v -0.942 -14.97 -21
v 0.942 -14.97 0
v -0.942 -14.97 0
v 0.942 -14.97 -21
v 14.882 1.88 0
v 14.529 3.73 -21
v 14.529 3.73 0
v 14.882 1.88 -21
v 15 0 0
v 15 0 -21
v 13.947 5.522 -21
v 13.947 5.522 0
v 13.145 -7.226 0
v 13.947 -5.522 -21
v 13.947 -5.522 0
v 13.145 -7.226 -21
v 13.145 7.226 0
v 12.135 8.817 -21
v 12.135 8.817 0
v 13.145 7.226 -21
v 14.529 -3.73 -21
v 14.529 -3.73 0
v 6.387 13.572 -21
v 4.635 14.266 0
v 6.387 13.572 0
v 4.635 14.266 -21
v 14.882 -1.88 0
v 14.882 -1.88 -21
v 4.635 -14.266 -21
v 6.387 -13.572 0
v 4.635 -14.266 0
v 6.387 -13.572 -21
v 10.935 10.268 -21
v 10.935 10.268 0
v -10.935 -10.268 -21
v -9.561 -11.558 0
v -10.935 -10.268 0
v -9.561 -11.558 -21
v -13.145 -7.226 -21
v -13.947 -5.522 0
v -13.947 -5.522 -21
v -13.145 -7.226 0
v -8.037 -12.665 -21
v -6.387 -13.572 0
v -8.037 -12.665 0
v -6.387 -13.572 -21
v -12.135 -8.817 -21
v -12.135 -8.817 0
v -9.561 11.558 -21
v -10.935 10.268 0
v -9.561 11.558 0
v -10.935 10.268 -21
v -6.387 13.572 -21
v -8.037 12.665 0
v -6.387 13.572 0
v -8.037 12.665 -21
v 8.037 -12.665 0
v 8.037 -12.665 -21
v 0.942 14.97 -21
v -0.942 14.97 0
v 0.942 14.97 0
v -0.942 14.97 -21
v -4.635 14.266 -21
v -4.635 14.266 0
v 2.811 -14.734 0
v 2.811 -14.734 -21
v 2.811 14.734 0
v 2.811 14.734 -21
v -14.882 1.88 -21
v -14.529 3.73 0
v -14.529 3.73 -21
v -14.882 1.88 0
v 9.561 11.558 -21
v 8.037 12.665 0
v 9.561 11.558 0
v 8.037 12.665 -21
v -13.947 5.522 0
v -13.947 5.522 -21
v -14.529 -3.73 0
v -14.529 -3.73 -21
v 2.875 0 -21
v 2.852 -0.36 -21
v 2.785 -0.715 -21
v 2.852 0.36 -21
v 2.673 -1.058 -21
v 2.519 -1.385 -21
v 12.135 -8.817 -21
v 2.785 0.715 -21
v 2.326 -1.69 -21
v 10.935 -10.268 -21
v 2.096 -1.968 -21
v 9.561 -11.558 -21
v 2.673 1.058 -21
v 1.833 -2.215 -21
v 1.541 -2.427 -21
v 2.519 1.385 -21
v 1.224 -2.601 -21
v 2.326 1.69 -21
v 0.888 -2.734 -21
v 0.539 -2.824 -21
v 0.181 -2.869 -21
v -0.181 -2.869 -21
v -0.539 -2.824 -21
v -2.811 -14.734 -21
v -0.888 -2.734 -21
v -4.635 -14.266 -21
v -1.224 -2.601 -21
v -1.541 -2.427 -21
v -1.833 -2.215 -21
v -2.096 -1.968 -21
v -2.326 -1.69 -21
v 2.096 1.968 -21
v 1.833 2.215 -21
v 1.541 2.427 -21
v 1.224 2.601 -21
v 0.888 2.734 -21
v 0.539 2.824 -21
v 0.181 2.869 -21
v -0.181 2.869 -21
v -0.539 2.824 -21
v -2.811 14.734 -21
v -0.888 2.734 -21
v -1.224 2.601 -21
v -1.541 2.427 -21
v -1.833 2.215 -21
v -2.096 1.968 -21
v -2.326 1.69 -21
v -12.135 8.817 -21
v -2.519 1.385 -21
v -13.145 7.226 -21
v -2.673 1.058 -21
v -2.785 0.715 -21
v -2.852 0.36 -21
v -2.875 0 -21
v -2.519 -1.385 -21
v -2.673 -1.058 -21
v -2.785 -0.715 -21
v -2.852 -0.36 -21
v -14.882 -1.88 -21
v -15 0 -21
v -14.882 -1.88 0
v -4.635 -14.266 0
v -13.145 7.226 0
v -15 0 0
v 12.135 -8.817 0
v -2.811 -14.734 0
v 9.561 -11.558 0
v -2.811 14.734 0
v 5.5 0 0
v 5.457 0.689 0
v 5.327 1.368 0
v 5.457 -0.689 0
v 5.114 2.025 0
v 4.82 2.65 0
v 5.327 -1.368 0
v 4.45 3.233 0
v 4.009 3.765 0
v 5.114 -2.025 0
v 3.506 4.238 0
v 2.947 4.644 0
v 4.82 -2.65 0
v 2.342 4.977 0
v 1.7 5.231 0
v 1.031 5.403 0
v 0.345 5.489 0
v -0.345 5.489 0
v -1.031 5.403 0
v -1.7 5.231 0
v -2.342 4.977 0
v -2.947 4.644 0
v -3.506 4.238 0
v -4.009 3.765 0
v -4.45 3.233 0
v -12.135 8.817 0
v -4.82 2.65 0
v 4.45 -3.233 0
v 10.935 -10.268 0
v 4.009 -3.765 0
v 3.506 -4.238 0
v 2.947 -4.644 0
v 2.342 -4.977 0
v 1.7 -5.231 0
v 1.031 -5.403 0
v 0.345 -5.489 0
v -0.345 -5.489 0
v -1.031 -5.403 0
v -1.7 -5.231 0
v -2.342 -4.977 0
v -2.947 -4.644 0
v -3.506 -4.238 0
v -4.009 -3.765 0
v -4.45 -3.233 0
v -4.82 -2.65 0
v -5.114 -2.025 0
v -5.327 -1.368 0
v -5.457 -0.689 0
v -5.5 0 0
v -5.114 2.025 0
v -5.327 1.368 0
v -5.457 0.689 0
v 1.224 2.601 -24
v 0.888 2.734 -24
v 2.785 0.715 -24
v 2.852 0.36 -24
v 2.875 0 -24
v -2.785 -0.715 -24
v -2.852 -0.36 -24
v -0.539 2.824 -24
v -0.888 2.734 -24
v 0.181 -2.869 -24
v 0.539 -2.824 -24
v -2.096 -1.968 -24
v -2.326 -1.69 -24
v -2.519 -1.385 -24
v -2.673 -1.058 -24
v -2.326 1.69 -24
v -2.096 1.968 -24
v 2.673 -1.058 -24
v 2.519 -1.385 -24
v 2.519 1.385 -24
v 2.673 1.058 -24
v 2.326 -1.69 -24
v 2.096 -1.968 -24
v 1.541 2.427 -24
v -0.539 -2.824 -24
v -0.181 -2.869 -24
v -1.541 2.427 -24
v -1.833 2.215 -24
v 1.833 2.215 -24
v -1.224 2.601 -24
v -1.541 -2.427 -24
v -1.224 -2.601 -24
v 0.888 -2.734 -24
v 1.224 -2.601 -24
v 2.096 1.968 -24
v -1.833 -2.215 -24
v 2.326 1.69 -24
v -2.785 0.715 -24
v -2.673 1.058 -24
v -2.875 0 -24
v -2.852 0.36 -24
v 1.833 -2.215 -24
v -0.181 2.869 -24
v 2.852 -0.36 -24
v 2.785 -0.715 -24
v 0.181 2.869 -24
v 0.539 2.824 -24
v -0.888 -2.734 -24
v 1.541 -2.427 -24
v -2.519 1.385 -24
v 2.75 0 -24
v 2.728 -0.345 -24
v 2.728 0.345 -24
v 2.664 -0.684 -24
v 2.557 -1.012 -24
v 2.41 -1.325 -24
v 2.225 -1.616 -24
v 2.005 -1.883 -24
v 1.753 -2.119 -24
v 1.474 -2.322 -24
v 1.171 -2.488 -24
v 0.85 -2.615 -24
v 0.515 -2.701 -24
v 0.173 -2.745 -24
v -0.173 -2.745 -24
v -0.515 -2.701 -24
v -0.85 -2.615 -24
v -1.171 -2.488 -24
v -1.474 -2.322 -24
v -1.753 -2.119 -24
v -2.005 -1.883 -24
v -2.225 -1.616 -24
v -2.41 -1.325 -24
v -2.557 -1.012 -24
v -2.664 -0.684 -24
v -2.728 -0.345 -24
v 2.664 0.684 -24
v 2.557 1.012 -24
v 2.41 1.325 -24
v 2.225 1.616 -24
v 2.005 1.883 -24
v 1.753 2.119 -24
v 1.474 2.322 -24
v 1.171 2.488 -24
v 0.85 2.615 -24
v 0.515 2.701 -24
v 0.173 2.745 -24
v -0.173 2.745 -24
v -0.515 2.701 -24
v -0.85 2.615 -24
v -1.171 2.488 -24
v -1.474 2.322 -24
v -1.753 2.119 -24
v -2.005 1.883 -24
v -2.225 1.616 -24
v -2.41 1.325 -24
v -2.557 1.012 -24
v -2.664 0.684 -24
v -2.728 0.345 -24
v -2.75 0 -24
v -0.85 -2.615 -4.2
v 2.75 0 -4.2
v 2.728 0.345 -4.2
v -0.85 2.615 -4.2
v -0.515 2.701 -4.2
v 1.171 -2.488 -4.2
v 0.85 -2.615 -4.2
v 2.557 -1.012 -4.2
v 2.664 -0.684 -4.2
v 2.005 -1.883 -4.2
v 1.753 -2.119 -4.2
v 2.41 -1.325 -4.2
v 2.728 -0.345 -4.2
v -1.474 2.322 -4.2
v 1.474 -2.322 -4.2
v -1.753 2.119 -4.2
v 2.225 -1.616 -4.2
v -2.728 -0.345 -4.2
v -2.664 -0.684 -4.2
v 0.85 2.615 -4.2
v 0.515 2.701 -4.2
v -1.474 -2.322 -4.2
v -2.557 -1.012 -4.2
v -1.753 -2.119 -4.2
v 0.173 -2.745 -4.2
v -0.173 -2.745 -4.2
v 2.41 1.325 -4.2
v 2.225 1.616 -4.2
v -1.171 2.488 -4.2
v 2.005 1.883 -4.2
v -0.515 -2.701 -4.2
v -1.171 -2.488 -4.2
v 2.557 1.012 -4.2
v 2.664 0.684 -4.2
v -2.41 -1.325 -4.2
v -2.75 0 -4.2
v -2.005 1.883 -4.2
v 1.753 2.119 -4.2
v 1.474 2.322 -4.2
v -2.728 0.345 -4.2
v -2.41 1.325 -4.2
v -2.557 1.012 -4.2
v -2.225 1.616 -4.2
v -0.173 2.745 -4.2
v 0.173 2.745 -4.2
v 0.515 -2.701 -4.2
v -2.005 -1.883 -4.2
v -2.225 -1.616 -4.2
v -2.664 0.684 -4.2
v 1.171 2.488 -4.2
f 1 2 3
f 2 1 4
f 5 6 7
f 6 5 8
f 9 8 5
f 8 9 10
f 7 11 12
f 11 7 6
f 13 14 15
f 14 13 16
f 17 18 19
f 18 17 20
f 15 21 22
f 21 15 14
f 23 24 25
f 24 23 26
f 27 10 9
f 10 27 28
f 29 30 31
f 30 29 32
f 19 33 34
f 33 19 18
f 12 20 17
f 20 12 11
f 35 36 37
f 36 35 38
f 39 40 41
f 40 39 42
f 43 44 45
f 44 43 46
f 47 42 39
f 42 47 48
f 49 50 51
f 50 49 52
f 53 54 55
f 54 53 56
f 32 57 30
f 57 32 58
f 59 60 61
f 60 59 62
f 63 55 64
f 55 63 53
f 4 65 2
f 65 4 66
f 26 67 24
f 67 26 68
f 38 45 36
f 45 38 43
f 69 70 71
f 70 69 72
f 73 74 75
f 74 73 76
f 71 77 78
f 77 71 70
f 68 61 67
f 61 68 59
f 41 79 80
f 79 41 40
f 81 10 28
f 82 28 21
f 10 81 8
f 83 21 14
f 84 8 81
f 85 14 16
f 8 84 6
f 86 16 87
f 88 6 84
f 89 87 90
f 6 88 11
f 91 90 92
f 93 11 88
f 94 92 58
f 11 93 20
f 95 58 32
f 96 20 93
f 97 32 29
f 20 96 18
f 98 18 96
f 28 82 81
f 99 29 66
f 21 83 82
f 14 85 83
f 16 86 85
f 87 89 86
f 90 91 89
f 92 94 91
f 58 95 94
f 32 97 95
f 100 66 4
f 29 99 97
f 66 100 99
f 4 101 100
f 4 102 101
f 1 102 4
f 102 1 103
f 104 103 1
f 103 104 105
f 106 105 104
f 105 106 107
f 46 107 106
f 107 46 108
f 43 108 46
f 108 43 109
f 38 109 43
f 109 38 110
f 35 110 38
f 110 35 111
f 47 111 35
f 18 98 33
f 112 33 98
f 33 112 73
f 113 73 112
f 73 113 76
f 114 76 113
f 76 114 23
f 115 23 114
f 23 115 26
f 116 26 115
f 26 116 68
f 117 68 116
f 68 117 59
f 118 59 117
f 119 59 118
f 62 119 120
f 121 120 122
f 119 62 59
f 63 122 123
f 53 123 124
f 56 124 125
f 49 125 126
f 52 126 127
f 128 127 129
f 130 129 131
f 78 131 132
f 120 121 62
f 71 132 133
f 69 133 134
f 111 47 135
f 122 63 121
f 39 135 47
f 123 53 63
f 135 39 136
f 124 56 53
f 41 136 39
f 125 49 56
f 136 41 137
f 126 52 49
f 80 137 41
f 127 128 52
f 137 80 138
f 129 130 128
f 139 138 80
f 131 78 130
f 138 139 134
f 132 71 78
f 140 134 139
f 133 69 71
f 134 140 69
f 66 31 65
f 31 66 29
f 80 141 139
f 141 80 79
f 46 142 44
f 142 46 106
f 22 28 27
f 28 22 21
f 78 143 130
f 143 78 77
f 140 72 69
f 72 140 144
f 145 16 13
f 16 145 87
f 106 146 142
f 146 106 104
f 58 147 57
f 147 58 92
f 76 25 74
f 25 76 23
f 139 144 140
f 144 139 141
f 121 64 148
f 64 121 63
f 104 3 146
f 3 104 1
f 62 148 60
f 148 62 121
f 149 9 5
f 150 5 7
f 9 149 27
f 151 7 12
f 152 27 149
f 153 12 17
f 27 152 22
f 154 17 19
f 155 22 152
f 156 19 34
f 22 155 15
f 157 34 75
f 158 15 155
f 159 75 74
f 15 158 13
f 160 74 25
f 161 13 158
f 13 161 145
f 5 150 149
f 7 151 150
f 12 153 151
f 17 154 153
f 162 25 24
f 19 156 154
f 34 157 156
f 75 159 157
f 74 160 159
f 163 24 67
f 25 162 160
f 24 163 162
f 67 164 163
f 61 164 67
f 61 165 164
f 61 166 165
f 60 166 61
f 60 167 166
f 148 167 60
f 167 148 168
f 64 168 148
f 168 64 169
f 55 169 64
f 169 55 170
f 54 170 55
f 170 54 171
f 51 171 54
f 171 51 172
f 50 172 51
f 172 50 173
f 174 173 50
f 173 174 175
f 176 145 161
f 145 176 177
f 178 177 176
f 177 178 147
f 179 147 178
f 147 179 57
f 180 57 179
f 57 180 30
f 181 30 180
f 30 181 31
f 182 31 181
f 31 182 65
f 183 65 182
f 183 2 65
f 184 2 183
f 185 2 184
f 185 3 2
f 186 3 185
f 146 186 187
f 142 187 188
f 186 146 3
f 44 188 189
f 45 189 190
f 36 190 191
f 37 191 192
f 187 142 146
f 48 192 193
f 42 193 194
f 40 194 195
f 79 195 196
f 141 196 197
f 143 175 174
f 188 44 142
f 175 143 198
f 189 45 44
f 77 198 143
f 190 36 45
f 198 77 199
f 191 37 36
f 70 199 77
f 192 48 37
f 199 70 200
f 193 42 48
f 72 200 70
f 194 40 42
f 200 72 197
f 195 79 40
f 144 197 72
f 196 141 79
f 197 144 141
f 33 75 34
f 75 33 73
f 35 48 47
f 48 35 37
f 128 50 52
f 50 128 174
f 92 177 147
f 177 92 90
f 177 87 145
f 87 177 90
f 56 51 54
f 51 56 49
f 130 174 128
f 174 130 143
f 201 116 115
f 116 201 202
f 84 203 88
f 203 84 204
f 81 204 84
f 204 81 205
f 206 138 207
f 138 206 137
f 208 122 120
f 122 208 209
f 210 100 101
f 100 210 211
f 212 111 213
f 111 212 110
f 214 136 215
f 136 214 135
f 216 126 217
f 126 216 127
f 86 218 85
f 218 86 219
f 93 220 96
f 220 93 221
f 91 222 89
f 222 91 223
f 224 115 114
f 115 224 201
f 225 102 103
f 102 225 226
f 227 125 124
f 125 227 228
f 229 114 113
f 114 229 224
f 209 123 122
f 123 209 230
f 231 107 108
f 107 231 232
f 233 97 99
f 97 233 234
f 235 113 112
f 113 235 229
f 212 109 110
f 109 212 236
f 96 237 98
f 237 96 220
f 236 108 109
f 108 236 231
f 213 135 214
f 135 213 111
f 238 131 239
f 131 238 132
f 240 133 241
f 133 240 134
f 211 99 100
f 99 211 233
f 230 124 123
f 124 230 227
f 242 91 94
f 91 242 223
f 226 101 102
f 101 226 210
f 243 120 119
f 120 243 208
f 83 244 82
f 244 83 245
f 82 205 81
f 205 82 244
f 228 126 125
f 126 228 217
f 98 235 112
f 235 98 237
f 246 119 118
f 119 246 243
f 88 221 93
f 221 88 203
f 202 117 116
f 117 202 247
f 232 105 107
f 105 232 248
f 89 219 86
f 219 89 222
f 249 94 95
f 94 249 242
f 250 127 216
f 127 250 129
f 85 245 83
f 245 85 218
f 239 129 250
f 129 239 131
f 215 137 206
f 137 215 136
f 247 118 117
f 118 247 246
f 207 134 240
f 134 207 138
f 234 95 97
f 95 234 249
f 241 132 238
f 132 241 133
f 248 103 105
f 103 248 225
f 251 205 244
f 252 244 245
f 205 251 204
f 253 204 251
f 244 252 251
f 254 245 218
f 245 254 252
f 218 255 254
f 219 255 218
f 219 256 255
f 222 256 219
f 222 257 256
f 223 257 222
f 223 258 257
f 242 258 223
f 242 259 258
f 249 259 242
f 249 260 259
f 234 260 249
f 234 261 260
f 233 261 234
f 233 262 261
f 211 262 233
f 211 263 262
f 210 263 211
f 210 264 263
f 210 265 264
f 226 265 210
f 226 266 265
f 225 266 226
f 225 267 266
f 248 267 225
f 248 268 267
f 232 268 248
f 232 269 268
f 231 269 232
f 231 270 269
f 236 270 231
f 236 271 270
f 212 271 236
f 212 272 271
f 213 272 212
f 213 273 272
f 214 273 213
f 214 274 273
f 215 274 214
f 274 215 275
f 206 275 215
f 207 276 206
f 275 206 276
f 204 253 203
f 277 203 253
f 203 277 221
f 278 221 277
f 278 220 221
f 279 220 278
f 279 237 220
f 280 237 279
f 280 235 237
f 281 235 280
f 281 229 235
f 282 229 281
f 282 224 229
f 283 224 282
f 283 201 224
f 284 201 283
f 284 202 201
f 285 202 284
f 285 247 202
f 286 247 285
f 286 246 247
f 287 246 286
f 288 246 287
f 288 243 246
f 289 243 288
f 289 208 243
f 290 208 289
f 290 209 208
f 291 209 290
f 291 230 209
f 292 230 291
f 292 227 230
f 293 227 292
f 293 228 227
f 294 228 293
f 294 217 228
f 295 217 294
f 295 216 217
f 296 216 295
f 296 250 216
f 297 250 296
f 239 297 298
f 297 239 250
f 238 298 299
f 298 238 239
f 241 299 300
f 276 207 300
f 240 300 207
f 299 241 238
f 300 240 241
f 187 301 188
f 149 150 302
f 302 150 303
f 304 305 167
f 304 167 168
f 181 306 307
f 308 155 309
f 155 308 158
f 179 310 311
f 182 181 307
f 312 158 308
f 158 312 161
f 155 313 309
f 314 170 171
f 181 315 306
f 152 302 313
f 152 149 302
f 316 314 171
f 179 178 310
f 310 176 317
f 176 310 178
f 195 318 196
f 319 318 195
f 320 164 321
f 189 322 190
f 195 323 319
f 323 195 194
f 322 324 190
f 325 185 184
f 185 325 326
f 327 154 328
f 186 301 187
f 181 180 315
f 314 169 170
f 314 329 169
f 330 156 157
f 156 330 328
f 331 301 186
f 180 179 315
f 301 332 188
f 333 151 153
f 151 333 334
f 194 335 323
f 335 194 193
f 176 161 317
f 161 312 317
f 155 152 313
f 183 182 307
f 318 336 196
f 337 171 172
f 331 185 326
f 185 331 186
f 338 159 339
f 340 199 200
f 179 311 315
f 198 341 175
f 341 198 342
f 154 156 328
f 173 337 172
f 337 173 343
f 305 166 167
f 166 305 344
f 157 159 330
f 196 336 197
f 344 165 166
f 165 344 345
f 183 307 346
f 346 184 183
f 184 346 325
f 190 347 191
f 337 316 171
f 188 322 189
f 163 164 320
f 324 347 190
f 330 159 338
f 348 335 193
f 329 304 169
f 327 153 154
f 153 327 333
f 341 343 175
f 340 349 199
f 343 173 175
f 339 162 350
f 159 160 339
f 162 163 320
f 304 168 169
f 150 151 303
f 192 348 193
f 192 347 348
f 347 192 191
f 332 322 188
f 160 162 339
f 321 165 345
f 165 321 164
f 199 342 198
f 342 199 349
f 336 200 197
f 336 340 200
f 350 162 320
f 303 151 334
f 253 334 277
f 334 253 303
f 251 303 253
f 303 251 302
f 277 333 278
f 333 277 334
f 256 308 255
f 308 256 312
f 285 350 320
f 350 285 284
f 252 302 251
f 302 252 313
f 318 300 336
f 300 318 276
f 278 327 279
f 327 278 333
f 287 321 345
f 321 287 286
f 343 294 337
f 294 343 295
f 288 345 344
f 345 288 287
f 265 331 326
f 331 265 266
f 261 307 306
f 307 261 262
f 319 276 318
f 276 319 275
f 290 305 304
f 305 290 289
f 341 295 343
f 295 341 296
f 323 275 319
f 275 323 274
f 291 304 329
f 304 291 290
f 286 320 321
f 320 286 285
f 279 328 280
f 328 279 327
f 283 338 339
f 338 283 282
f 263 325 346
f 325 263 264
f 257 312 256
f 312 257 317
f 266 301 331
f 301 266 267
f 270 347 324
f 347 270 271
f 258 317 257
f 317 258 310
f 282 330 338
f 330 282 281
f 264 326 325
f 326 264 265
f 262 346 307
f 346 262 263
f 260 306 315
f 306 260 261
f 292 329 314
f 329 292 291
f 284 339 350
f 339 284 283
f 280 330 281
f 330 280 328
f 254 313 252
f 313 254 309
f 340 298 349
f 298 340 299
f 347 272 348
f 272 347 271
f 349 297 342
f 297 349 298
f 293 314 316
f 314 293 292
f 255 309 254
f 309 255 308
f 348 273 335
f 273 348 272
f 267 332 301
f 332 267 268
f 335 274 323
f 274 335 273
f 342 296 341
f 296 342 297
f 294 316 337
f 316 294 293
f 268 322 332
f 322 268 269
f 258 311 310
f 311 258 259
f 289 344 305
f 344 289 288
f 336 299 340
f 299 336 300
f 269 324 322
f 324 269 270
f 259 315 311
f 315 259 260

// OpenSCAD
$fn = 50;


difference() {
	union() {
		translate(v = [0, 0, -21.0000000000]) {
			cylinder(h = 21, r = 15.0000000000);
		}
		#translate(v = [0, 0, -24.0000000000]) {
			cylinder(h = 24, r = 2.8750000000);
		}
	}
	union() {
		translate(v = [0, 0, 0]) {
			rotate(a = [0, 0, 0]) {
				difference() {
					union() {
						translate(v = [0, 0, -24.0000000000]) {
							cylinder(h = 24, r = 2.2500000000);
						}
						translate(v = [0, 0, -4.2000000000]) {
							cylinder(h = 4.2000000000, r1 = 2.7500000000, r2 = 5.5000000000);
						}
						translate(v = [0, 0, -24.0000000000]) {
							cylinder(h = 24, r = 2.7500000000);
						}
						translate(v = [0, 0, -24.0000000000]) {
							cylinder(h = 24, r = 2.2500000000);
						}
					}
					union();
				}
			}
		}
	}
}
